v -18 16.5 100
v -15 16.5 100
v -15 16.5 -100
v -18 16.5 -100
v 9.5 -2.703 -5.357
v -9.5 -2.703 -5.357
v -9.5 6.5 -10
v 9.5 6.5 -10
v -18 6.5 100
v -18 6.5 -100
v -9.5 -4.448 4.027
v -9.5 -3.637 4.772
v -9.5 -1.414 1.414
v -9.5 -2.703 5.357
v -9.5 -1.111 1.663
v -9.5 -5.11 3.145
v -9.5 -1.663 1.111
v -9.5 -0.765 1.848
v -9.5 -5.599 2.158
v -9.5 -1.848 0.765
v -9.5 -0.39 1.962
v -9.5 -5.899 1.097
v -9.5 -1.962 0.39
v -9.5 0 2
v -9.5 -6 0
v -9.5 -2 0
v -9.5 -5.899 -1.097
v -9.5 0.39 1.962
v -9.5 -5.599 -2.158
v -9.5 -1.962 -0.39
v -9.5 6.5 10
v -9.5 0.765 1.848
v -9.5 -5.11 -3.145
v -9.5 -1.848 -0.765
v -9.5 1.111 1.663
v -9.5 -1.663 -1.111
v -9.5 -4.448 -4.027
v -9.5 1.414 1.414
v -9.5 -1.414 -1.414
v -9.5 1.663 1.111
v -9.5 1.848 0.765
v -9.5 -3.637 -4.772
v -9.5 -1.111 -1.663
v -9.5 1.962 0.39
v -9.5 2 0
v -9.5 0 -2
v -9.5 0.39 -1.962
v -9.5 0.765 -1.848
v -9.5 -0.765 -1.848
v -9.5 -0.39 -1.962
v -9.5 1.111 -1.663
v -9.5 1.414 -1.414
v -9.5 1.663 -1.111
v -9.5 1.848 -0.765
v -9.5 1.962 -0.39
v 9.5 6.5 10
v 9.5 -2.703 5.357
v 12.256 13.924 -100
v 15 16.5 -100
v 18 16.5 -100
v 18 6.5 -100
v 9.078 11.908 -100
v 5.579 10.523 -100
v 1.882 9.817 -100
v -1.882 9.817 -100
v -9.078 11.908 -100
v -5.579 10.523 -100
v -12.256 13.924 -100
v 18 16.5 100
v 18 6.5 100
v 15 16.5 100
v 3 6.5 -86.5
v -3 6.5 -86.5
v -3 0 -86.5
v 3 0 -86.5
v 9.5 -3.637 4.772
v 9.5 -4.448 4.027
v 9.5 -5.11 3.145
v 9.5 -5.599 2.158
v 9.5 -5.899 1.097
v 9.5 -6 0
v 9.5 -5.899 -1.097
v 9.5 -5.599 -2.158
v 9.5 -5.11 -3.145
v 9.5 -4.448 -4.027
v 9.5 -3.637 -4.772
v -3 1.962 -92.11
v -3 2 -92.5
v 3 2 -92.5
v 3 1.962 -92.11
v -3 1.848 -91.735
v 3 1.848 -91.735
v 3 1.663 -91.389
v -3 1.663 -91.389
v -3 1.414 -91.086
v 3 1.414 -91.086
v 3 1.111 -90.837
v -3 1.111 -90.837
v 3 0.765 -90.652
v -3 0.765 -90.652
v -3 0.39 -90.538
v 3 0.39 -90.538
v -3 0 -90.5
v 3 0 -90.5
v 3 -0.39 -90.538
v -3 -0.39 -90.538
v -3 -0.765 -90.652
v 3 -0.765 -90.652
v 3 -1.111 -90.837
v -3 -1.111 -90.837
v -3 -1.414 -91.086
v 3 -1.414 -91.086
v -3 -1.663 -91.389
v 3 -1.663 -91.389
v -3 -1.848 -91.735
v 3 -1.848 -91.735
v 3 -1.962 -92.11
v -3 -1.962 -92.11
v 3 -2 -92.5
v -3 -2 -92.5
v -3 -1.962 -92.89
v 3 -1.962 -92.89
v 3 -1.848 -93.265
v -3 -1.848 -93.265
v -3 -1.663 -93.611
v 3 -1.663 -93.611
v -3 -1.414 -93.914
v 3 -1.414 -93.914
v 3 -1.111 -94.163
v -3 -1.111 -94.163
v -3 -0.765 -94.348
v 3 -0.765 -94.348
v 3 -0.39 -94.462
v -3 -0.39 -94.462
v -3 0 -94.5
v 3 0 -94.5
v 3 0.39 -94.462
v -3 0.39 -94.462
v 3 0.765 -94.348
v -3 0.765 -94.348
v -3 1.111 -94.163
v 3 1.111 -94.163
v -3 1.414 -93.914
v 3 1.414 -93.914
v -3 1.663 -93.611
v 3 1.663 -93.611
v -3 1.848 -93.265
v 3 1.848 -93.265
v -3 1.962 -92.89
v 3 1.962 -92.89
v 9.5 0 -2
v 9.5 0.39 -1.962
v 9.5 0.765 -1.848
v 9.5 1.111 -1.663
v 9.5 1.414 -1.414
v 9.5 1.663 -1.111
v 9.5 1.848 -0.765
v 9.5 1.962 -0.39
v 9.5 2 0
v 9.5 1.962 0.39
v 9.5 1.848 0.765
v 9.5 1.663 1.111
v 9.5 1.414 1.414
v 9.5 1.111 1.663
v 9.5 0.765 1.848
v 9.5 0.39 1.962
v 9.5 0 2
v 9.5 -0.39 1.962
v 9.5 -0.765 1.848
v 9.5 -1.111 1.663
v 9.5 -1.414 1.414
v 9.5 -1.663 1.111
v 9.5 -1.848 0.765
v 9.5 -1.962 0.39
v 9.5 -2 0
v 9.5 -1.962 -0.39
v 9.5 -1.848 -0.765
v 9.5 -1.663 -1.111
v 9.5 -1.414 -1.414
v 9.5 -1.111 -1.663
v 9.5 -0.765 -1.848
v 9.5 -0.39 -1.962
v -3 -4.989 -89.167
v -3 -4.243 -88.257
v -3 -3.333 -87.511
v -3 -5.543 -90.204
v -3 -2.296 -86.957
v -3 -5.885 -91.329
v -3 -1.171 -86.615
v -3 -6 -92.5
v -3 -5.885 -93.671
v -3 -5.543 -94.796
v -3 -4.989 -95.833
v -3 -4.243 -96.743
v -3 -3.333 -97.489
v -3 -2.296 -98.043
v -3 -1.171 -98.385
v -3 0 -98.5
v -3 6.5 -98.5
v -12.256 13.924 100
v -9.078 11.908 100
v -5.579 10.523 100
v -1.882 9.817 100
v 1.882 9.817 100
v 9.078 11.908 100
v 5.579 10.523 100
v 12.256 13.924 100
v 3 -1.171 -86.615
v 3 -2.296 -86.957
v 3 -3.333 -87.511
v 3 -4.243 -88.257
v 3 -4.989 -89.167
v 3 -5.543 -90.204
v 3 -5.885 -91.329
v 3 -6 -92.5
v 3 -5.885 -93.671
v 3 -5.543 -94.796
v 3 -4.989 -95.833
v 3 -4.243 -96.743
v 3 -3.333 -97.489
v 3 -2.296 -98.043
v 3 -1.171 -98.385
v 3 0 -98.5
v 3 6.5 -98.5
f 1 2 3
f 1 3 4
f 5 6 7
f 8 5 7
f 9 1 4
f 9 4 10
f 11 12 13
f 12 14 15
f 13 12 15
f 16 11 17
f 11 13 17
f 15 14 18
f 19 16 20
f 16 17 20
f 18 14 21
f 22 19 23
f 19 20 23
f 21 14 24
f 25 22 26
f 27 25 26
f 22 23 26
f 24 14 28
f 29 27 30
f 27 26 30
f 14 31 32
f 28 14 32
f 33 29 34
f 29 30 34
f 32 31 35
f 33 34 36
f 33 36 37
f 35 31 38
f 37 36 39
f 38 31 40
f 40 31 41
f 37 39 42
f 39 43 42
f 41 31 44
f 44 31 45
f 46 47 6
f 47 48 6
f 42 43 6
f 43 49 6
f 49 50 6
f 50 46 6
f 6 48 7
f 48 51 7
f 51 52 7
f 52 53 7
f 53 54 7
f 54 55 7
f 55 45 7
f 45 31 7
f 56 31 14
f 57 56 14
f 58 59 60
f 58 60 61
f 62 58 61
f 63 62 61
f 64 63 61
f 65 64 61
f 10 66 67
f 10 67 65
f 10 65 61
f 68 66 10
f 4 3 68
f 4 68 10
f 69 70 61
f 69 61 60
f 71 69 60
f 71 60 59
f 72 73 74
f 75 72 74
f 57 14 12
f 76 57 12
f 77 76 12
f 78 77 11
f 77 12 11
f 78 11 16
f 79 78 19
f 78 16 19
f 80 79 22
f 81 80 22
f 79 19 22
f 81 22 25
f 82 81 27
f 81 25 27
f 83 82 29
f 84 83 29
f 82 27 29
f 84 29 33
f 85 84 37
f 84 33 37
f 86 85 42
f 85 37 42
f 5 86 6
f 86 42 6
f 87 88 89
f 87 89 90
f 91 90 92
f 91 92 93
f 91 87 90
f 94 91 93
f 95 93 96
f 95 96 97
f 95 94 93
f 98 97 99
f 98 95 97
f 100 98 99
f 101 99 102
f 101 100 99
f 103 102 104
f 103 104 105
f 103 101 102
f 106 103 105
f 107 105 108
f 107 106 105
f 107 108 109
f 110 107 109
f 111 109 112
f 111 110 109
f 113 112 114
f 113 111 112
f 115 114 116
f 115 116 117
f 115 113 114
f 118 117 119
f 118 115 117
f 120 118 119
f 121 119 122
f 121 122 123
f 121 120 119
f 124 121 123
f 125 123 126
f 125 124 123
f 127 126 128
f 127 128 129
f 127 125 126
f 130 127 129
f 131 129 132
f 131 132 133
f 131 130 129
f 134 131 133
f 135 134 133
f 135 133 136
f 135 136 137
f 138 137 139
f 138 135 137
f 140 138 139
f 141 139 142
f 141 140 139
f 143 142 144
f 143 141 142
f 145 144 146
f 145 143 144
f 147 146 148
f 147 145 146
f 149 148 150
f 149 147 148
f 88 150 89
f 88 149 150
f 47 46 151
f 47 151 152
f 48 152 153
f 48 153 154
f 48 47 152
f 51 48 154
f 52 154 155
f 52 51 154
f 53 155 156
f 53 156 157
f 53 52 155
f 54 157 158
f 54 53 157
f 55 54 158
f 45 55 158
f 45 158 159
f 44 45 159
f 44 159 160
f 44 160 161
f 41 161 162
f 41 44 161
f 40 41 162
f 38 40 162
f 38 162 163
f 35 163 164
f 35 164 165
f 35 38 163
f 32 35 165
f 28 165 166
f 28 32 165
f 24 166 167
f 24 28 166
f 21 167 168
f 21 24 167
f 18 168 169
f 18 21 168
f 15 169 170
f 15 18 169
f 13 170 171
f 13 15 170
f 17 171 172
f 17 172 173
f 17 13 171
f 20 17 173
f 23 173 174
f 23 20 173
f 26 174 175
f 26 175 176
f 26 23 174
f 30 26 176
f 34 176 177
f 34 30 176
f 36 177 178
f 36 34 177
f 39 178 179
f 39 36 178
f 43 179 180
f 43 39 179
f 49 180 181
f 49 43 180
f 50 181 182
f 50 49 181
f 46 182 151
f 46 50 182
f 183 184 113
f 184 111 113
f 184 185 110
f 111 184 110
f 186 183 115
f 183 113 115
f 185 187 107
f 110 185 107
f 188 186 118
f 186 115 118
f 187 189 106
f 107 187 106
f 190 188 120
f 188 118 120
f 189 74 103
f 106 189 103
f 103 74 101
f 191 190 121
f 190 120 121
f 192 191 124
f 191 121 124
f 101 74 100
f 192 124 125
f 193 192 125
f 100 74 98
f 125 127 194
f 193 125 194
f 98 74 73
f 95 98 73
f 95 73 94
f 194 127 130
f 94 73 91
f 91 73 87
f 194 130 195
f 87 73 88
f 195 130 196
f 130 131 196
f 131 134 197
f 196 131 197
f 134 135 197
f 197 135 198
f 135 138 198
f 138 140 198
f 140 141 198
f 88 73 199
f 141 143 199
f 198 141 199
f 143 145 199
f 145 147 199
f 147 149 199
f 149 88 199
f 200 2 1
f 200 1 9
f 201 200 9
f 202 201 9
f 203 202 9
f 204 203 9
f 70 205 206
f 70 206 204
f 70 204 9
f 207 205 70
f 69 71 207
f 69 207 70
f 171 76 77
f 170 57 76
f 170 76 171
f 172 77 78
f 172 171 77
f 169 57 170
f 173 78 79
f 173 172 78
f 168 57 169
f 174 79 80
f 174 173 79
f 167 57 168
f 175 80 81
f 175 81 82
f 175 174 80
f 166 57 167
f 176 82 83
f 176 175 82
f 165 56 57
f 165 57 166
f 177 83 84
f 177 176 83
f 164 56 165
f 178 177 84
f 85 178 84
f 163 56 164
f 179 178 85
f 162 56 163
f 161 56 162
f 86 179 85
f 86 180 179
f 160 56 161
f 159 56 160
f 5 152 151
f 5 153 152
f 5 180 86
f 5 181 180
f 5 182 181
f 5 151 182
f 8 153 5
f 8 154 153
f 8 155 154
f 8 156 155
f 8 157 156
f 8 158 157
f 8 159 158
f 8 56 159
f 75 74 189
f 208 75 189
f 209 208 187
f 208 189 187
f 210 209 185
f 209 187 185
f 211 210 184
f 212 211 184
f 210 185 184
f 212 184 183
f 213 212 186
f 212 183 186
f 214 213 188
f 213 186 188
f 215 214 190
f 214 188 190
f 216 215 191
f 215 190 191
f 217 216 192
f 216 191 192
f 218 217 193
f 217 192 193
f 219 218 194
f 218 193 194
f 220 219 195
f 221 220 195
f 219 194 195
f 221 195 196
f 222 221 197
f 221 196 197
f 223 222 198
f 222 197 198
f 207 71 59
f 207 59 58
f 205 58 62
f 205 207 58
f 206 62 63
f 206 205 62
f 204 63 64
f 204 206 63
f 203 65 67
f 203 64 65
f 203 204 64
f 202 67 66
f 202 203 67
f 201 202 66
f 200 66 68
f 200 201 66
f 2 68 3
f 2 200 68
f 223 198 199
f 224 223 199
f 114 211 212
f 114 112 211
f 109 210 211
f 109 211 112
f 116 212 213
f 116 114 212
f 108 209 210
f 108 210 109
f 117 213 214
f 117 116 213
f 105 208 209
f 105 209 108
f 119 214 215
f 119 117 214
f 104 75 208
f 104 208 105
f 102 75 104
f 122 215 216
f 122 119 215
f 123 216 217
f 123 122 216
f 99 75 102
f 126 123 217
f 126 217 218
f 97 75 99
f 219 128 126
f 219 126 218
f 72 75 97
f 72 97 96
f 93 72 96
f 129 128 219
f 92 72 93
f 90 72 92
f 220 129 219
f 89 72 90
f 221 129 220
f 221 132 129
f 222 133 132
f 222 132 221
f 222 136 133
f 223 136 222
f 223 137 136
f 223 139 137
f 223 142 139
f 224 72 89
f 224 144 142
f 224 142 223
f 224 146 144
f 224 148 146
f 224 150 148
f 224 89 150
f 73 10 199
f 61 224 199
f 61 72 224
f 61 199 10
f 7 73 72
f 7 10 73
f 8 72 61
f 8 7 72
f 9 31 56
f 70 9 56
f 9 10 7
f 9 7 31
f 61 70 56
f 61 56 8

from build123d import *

# Parameters (mm, degrees)
THICKEN1_START           = -92.5
THICKEN1_OUTLINE_W       = 30
THICKEN1_OUTLINE_H       = 4.5
THICKEN1_DEPTH           = 185
THICKEN2_START           = -92.5
THICKEN2_OUTLINE_W       = 3
THICKEN2_OUTLINE_H       = 18
THICKEN2_DEPTH           = 185
THICKEN3_START           = -92.5
THICKEN3_OUTLINE_W       = 3
THICKEN3_OUTLINE_H       = 18
THICKEN3_DEPTH           = 185
BOSS_EXTRUDE1_DEPTH      = 185
SKETCH7_W                = 36
SKETCH7_H                = 8
CUT_EXTRUDE1_DEPTH       = 187.604528348
BOSS_EXTRUDE2_DEPTH      = 7.5
BOSS_EXTRUDE3_START      = 7.5
BOSS_EXTRUDE3_DEPTH      = 7.5
BOSS_EXTRUDE4_DEPTH      = 9.5
BOSS_EXTRUDE4_DEPTH_BACK = 9.5
SKETCH10_R               = 6
SKETCH10_R_2             = 2
BOSS_EXTRUDE5_DEPTH      = 3
BOSS_EXTRUDE5_DEPTH_BACK = 3
SKETCH11_R               = 6
SKETCH11_R_2             = 2


# Read off the part's stored shape, not the designer's step: Thicken1, Thicken2, Thicken3
with BuildPart() as part:
    # Thicken1 outline → Thicken1 (new body)
    with BuildSketch(Plane.XY.offset(THICKEN1_START)):
        with Locations((0, 0.75)):
            Rectangle(THICKEN1_OUTLINE_W, THICKEN1_OUTLINE_H)
    extrude(amount=THICKEN1_DEPTH)

    # Thicken2 outline → Thicken2 (add)
    with BuildSketch(Plane.XY.offset(THICKEN2_START)):
        with Locations((16.5, 7.5)):
            Rectangle(THICKEN2_OUTLINE_W, THICKEN2_OUTLINE_H)
    extrude(amount=THICKEN2_DEPTH)

    # Thicken3 outline → Thicken3 (add)
    with BuildSketch(Plane.XY.offset(THICKEN3_START)):
        with Locations((-16.5, 7.5)):
            Rectangle(THICKEN3_OUTLINE_W, THICKEN3_OUTLINE_H)
    extrude(amount=THICKEN3_DEPTH)

    # Sketch4 → Boss-Extrude1 (add)
    with BuildSketch(Plane.XY.offset(92.5)):
        with BuildLine():
            Line((-15, 16.5), (-15, 3))
            Line((-15, 3), (15, 3))
            Line((15, 3), (15, 16.5))
            ThreePointArc((15, 16.5), (0, 9.728756555), (-15, 16.5))
        make_face()
    extrude(amount=-BOSS_EXTRUDE1_DEPTH)

    # Sketch7 → Cut-Extrude1 (cut, through all)
    with BuildSketch(Plane(origin=(0, 0, -92.5), x_dir=(-1, 0, 0), z_dir=(0, 0, -1))):
        with Locations((0, 2.5)):
            Rectangle(SKETCH7_W, SKETCH7_H)
    extrude(amount=-CUT_EXTRUDE1_DEPTH, mode=Mode.SUBTRACT)

    # Sketch8 → Boss-Extrude2 (add)
    with BuildSketch(Plane(origin=(0, 0, -92.5), x_dir=(-1, 0, 0), z_dir=(0, 0, -1))):
        with BuildLine():
            Line((-18, 6.5), (18, 6.5))
            Line((18, 6.5), (18, 16.5))
            Line((18, 16.5), (15, 16.5))
            ThreePointArc((15, 16.5), (0, 9.728756555), (-15, 16.5))
            Line((-15, 16.5), (-18, 16.5))
            Line((-18, 16.5), (-18, 6.5))
        make_face()
    extrude(amount=BOSS_EXTRUDE2_DEPTH)

    # Sketch9 → Boss-Extrude3 (add)
    with BuildSketch(Plane.XY.offset(92.5).offset(BOSS_EXTRUDE3_START)):
        with BuildLine():
            Line((-18, 6.5), (18, 6.5))
            Line((18, 6.5), (18, 16.5))
            Line((18, 16.5), (15, 16.5))
            ThreePointArc((15, 16.5), (0, 9.728756555), (-15, 16.5))
            Line((-15, 16.5), (-18, 16.5))
            Line((-18, 16.5), (-18, 6.5))
        make_face()
    extrude(amount=-BOSS_EXTRUDE3_DEPTH)

    # Sketch10 → Boss-Extrude4 (add, two sides: drawn at the far end of the back side and taken through both)
    # profile 1 of 2: a face of its own
    with BuildSketch(Plane(origin=(0, 0, 0), x_dir=(0, 0, -1), z_dir=(1, 0, 0)).offset(-BOSS_EXTRUDE4_DEPTH_BACK)):
        Circle(SKETCH10_R)
        Circle(SKETCH10_R_2, mode=Mode.SUBTRACT)
    # profile 2 of 2: a face of its own
    with BuildSketch(Plane(origin=(0, 0, 0), x_dir=(0, 0, -1), z_dir=(1, 0, 0)).offset(-BOSS_EXTRUDE4_DEPTH_BACK)):
        with BuildLine():
            Line((10, 6.5), (-10, 6.5))
            Line((-10, 6.5), (-5.35678593, -2.702747584))
            ThreePointArc((-5.35678593, -2.702747584), (-1.389115622, 5.836981908), (6, 0))
            ThreePointArc((6, 0), (5.836981908, -1.389115622), (5.35678593, -2.702747584))
            Line((5.35678593, -2.702747584), (10, 6.5))
        make_face()
    extrude(amount=BOSS_EXTRUDE4_DEPTH + BOSS_EXTRUDE4_DEPTH_BACK)

    # Sketch11 → Boss-Extrude5 (add, two sides: drawn at the far end of the back side and taken through both)
    # profile 1 of 2: a face of its own
    with BuildSketch(Plane(origin=(0, 0, 0), x_dir=(0, 0, -1), z_dir=(1, 0, 0)).offset(-BOSS_EXTRUDE5_DEPTH_BACK)):
        with Locations((92.5, 0)):
            Circle(SKETCH11_R)
        with Locations(Location((92.5, 0, 0), (0, 0, 90))):
            Circle(SKETCH11_R_2, mode=Mode.SUBTRACT)
    # profile 2 of 2: a face of its own
    with BuildSketch(Plane(origin=(0, 0, 0), x_dir=(0, 0, -1), z_dir=(1, 0, 0)).offset(-BOSS_EXTRUDE5_DEPTH_BACK)):
        with BuildLine():
            ThreePointArc((86.5, 0), (92.5, 6), (98.5, 0))
            Line((98.5, 0), (98.5, 6.5))
            Line((98.5, 6.5), (86.5, 6.5))
            Line((86.5, 6.5), (86.5, 0))
        make_face()
    extrude(amount=BOSS_EXTRUDE5_DEPTH + BOSS_EXTRUDE5_DEPTH_BACK)


solid = part.part
